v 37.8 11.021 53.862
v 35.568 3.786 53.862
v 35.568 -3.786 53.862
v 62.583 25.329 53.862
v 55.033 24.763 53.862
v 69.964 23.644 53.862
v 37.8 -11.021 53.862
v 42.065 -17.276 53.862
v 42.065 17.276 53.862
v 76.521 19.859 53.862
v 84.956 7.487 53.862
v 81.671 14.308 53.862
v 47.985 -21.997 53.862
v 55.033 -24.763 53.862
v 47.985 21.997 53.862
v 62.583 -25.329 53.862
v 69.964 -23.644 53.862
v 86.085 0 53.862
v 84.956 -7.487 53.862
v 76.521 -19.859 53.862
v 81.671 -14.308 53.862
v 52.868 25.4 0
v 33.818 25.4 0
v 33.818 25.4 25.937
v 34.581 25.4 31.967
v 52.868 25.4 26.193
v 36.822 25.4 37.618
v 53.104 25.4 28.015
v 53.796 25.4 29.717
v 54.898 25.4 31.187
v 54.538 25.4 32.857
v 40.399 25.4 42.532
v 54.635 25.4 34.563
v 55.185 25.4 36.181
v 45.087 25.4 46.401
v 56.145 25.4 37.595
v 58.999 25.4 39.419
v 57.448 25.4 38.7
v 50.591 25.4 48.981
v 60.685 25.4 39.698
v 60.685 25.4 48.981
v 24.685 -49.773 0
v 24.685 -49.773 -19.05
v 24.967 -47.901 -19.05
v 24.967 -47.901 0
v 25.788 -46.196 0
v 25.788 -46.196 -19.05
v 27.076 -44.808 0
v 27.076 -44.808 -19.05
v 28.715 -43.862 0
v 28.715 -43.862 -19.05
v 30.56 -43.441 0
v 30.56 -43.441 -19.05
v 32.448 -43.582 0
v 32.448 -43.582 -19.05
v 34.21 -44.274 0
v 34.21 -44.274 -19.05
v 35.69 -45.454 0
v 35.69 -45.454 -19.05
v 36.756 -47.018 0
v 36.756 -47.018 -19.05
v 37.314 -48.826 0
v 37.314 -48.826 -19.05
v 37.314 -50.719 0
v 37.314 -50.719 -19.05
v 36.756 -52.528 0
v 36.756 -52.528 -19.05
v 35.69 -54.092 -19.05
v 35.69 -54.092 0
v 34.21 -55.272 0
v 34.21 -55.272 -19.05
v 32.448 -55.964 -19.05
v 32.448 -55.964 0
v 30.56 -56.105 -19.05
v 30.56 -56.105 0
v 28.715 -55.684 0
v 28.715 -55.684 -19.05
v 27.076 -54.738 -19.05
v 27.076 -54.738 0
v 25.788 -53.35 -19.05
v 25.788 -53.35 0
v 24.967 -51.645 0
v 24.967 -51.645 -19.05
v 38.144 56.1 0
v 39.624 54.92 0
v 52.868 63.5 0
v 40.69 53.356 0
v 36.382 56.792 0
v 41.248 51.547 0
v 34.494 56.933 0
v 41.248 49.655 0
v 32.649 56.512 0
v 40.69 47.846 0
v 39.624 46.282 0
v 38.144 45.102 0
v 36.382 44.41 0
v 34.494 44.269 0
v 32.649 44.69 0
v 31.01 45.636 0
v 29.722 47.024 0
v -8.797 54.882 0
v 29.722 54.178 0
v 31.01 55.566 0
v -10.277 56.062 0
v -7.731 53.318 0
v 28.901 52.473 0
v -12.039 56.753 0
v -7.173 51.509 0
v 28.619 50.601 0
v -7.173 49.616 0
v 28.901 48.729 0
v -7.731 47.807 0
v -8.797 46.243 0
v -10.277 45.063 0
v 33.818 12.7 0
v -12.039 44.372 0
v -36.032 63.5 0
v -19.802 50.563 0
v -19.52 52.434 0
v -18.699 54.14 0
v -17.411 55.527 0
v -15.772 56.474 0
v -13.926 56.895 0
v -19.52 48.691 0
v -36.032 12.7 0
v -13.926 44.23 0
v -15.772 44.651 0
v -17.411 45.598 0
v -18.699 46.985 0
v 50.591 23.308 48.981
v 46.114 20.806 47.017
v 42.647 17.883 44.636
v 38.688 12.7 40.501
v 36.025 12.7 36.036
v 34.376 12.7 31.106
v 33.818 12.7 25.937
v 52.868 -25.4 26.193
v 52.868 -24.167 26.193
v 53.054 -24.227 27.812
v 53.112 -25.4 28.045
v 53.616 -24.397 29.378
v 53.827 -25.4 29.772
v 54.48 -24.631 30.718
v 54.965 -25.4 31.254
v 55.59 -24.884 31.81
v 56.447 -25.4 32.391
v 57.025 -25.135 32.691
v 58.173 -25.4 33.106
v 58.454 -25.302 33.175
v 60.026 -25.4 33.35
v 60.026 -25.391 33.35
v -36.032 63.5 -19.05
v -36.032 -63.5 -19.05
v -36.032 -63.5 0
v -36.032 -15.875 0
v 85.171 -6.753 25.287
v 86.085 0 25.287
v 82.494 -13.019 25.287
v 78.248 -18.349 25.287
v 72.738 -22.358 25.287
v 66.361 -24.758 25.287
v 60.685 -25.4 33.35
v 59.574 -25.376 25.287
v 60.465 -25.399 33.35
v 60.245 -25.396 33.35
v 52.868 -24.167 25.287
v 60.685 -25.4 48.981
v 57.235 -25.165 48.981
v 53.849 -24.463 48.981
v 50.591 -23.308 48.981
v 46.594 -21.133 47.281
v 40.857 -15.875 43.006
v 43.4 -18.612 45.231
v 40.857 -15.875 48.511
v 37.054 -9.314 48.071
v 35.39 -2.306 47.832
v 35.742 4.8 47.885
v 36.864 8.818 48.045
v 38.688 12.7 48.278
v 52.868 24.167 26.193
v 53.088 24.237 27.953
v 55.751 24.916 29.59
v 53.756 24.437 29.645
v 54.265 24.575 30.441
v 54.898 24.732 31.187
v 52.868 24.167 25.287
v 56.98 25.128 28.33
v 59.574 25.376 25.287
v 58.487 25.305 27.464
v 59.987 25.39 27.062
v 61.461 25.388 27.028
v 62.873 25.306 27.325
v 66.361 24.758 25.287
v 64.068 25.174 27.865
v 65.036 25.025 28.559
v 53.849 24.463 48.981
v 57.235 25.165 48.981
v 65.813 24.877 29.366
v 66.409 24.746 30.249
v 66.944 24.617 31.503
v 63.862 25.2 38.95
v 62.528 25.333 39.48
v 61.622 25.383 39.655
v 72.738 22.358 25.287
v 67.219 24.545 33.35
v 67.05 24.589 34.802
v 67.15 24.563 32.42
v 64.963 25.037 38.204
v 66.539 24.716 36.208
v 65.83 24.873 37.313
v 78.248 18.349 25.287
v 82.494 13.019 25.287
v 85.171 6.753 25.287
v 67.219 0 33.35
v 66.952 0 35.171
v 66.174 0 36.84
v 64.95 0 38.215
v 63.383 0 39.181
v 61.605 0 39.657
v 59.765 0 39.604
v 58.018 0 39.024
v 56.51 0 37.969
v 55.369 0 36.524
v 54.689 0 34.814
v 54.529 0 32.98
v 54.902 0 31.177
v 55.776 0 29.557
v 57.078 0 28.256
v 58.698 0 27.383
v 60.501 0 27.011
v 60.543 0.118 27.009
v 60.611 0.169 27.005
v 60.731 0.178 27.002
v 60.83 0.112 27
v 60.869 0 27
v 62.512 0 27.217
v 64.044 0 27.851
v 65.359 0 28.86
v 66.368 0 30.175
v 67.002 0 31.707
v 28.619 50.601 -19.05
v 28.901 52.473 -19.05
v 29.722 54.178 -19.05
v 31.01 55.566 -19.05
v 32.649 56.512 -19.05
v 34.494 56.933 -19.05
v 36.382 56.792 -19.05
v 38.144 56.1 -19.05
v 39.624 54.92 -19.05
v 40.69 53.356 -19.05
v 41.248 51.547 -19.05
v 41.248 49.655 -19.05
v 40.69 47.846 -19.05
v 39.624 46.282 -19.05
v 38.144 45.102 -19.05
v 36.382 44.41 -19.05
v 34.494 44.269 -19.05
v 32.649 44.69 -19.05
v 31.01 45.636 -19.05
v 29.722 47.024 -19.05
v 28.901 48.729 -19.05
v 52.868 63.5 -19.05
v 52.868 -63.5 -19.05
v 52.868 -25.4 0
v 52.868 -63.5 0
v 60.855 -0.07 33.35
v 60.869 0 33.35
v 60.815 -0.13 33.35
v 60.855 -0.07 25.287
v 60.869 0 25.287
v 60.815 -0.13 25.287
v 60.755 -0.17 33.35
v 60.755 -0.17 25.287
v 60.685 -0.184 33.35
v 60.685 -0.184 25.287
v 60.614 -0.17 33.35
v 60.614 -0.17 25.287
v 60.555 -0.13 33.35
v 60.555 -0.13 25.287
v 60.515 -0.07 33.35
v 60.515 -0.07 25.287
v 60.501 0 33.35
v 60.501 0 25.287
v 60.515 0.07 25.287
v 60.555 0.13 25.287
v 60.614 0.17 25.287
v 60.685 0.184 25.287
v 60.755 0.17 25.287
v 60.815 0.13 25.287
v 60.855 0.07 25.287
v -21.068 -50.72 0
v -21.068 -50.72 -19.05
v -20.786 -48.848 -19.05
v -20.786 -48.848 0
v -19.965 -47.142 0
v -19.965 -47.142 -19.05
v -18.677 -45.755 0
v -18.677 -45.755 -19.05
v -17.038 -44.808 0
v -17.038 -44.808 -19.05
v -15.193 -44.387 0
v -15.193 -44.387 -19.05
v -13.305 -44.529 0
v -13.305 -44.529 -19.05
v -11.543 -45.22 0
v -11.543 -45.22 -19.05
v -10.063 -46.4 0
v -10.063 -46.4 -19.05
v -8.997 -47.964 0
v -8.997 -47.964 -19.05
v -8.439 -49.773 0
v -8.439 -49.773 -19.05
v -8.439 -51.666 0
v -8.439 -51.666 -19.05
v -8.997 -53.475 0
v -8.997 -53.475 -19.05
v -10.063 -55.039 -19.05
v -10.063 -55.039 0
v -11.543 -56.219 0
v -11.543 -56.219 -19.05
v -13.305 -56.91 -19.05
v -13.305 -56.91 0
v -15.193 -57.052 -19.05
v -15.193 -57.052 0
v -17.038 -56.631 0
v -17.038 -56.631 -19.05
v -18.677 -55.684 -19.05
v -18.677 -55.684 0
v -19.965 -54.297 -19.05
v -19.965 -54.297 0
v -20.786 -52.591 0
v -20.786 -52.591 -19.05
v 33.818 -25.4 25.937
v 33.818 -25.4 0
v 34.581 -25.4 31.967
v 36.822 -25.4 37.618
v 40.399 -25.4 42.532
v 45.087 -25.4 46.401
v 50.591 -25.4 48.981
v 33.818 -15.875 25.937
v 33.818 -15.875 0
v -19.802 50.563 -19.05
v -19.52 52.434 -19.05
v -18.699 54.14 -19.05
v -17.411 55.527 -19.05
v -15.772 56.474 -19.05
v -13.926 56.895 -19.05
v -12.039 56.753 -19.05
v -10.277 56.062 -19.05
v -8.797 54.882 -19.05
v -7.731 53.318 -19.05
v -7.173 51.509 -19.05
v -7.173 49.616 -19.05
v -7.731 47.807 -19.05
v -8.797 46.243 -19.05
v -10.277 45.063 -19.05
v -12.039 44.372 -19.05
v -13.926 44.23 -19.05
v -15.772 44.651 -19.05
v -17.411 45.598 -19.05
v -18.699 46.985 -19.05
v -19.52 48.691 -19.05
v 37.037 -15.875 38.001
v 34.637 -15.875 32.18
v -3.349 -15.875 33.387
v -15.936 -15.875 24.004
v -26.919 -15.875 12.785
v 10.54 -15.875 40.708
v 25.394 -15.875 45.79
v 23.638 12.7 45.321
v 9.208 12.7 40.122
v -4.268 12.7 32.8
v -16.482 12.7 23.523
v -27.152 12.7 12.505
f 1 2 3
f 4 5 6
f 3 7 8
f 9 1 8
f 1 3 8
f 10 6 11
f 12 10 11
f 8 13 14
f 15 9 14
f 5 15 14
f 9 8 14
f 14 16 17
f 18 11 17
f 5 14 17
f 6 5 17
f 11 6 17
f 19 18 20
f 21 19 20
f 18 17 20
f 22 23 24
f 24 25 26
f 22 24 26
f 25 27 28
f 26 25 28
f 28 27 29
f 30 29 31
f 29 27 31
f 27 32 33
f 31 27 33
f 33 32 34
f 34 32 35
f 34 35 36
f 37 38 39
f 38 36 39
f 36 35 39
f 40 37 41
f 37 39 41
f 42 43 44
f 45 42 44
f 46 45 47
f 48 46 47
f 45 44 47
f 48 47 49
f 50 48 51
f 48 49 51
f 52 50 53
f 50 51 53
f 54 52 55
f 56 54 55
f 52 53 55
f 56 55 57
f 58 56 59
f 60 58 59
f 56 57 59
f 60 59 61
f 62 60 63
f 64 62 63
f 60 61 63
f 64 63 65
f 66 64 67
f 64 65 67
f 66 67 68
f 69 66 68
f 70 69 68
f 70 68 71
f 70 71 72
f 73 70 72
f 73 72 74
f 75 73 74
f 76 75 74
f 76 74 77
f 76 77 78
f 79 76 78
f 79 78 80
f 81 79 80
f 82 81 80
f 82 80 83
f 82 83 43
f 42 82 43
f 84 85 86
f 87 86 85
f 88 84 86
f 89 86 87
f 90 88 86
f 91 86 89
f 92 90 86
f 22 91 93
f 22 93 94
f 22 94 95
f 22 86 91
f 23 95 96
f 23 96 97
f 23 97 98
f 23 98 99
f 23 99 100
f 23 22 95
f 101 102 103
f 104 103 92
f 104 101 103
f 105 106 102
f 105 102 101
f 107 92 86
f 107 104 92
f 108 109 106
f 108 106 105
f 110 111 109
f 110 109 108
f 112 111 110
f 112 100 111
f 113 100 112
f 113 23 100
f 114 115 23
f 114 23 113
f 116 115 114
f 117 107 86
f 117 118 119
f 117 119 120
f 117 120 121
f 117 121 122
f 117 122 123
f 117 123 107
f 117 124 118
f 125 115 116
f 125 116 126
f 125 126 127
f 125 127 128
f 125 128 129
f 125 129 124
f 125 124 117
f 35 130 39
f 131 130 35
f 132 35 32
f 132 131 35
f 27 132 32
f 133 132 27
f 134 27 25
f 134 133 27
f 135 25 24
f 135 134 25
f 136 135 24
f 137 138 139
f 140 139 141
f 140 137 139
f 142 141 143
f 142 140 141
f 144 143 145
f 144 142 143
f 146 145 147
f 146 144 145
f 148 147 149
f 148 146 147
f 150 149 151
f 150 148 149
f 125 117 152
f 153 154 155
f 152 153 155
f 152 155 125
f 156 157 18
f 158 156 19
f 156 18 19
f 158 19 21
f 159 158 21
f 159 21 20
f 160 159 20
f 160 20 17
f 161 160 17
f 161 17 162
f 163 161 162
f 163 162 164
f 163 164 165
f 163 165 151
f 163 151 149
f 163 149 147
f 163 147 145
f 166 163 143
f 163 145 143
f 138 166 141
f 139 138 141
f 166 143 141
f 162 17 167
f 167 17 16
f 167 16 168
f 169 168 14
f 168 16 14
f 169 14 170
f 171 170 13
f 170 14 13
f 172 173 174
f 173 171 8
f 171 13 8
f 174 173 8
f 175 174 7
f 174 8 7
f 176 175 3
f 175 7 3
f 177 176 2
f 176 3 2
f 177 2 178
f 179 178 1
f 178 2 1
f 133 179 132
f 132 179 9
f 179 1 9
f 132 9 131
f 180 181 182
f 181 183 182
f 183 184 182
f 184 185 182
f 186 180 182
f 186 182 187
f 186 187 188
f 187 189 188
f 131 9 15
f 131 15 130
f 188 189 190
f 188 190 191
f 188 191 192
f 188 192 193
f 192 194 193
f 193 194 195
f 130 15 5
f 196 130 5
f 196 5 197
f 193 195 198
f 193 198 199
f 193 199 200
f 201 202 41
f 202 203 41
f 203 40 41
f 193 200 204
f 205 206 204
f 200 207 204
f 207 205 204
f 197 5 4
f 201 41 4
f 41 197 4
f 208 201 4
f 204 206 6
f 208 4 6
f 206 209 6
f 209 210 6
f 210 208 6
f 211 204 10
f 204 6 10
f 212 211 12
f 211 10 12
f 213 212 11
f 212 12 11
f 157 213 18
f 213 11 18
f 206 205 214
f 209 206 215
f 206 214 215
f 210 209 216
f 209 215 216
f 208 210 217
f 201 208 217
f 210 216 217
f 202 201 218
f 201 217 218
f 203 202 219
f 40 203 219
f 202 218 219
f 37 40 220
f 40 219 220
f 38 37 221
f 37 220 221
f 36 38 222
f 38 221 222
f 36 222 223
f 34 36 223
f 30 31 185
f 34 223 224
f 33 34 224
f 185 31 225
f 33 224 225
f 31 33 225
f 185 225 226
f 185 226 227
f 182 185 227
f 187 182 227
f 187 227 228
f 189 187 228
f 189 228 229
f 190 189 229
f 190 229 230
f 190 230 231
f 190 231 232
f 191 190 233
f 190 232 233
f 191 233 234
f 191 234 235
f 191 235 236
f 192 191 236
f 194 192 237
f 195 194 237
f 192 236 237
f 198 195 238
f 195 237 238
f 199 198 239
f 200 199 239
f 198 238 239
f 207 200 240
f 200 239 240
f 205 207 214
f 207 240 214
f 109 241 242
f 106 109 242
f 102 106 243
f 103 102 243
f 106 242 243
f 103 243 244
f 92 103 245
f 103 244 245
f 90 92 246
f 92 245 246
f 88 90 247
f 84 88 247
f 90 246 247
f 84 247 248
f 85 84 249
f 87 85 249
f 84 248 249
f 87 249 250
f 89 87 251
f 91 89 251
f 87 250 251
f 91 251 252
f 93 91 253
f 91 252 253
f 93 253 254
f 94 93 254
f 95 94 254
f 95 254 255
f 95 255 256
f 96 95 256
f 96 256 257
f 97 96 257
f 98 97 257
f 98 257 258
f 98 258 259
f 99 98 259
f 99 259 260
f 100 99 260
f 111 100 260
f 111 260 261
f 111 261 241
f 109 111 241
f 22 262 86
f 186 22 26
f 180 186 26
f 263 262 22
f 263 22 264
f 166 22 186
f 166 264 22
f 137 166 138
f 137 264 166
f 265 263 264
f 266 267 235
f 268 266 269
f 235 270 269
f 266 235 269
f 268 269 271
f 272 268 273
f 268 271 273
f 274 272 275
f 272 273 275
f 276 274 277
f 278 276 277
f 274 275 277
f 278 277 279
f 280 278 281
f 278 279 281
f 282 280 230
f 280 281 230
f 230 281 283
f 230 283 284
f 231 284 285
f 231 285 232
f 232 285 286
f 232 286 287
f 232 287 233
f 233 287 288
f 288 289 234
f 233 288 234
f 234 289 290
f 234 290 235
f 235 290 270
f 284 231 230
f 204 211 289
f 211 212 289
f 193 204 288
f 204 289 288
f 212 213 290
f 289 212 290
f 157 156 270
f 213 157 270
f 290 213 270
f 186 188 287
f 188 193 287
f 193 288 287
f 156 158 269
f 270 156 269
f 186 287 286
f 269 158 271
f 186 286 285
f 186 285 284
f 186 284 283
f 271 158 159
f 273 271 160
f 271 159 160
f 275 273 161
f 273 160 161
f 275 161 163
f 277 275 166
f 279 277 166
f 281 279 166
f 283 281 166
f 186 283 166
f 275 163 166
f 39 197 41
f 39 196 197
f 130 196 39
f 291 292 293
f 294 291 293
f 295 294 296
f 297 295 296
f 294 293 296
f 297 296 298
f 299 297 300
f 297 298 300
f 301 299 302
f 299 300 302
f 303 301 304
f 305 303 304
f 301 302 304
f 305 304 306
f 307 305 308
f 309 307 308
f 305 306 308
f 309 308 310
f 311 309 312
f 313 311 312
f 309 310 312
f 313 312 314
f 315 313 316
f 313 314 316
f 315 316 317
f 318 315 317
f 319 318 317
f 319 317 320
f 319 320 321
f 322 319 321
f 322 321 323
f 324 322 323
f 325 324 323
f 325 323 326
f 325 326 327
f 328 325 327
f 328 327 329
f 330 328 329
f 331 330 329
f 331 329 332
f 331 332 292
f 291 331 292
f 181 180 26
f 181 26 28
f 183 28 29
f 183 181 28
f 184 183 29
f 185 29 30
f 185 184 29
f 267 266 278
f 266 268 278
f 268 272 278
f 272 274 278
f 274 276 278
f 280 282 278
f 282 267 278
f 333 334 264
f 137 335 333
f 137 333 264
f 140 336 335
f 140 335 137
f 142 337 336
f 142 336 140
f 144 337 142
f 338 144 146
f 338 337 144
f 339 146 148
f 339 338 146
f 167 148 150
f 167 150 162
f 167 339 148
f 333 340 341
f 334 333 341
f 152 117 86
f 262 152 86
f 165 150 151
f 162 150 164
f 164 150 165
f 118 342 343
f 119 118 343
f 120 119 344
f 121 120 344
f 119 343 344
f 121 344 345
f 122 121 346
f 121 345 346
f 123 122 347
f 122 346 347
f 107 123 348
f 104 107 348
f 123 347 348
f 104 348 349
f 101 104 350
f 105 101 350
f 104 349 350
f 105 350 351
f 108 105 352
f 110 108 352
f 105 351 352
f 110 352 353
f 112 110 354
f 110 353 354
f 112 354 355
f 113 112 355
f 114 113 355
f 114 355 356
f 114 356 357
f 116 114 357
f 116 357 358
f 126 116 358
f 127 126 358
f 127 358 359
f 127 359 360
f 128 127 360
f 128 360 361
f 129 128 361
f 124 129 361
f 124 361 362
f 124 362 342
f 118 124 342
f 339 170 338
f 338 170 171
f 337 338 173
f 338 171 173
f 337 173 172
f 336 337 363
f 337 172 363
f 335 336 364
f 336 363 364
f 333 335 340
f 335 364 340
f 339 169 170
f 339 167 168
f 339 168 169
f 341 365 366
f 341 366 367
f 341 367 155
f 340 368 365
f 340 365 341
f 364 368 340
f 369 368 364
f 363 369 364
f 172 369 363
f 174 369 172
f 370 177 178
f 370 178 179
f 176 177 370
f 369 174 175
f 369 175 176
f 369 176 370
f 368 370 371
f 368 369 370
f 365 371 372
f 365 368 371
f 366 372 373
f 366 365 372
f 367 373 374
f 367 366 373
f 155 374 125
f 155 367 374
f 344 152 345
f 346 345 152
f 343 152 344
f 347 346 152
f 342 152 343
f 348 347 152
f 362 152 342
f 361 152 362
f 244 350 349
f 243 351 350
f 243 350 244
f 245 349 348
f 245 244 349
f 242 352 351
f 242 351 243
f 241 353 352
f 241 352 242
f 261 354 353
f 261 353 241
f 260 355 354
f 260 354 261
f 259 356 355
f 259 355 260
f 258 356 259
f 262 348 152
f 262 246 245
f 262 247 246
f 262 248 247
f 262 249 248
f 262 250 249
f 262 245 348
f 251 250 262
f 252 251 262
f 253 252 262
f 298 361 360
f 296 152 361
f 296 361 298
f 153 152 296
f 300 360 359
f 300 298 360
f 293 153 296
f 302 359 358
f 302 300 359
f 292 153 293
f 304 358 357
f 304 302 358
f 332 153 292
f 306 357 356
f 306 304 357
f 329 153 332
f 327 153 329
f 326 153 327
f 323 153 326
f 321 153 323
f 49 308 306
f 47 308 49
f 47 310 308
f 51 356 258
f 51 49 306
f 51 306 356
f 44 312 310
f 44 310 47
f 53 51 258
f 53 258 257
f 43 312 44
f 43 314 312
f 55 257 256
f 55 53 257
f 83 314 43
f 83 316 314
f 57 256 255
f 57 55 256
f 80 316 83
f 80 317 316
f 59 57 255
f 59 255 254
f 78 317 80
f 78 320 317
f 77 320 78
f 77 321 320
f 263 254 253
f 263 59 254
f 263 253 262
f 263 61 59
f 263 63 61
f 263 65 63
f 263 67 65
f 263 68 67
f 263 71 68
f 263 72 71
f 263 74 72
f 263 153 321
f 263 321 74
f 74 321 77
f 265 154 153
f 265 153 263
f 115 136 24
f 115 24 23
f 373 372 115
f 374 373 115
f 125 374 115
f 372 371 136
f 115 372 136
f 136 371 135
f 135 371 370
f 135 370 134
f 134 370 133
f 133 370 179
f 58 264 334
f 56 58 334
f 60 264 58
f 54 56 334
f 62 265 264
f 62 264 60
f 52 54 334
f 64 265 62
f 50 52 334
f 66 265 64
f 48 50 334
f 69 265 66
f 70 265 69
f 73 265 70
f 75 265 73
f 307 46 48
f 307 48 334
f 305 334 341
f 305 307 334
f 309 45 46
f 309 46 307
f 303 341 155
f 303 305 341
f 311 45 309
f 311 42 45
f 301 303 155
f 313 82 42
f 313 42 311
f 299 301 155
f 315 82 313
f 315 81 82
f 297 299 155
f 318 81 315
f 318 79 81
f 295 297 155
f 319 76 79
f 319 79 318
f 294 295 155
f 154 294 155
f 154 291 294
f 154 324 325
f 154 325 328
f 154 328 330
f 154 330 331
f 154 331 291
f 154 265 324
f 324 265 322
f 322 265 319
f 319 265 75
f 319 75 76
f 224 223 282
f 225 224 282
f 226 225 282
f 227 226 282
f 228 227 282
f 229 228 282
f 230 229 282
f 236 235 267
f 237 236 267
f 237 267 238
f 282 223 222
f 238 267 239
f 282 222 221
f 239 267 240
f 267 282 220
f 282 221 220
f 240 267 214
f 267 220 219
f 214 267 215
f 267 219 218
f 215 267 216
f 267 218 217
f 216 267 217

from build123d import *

# Parameters (mm, degrees)
F1_DEPTH        = 63.5
F2_DEPTH        = 15.875
F3_DEPTH        = 63.5
F0_W            = 19.05
F0_H            = 17.5050515682
F4_DEPTH        = 25.4
F5_DEPTH        = 25.4
F6_DEPTH        = 25.4
F7_DEPTH        = 12.7
F10_D           = 12.7
F10_ON_F0_D     = 12.7
F10_ON_F0_DEPTH = 63.501


with BuildPart() as f1:
    # F0 (on Front) → F1 (new body)
    with BuildSketch(Plane.XZ):
        Polygon((-36.0317155719, 0), (-36.0317155719, -19.05), (52.8682844281, -19.05), (52.8682844281, 0), (33.8182844281, 0), align=None)
    extrude(amount=F1_DEPTH)

    # F0 (on Front) → F2 (join)
    with BuildSketch(Plane.XZ):
        with BuildLine():
            ThreePointArc((50.590518862, 48.9809869127), (0.8347438774, 35.8877863894), (-36.0317155719, 0))
            Line((-36.0317155719, 0), (33.8182844281, 0))
            Line((33.8182844281, 0), (33.8182844281, 17.5050515682))
            Line((33.8182844281, 17.5050515682), (33.8182844281, 25.9368028492))
            ThreePointArc((33.8182844281, 25.9368028492), (38.4552849671, 40.1876121864), (50.590518862, 48.9809869127))
        make_face()
    extrude(amount=F2_DEPTH)

    # F0 (on Front) → F3 (join)
    with BuildSketch(Plane.XZ):
        Polygon((-36.0317155719, 0), (-36.0317155719, -19.05), (52.8682844281, -19.05), (52.8682844281, 0), (33.8182844281, 0), align=None)
    extrude(amount=-F3_DEPTH)

    # F0 (on Front) → F4 (join)
    with BuildSketch(Plane.XZ):
        with BuildLine():
            Line((60.4371747272, 48.9809869127), (50.590518862, 48.9809869127))
            ThreePointArc((50.590518862, 48.9809869127), (38.4552849671, 40.1876121864), (33.8182844281, 25.9368028492))
            Line((33.8182844281, 25.9368028492), (33.8182844281, 17.5050515682))
            Line((33.8182844281, 17.5050515682), (52.8682844281, 17.5050515682))
            Line((52.8682844281, 17.5050515682), (52.8682844281, 26.1928199722))
            ThreePointArc((52.8682844281, 26.1928199722), (54.9646325027, 31.2538519254), (60.0256644559, 33.3502))
            Line((60.0256644559, 33.3502), (60.6846340656, 33.3502))
            Line((60.6846340656, 33.3502), (60.6846340656, 48.9809869127))
            Line((60.6846340656, 48.9809869127), (60.4371747272, 48.9809869127))
        make_face()
        with Locations((43.3432844281, 8.7525257841)):
            Rectangle(F0_W, F0_H)
    extrude(amount=F4_DEPTH)

    # F0 (on Front) → F5 (join)
    with BuildSketch(Plane.XZ):
        with BuildLine():
            Line((60.4371747272, 48.9809869127), (50.590518862, 48.9809869127))
            ThreePointArc((50.590518862, 48.9809869127), (38.4552849671, 40.1876121864), (33.8182844281, 25.9368028492))
            Line((33.8182844281, 25.9368028492), (33.8182844281, 17.5050515682))
            Line((33.8182844281, 17.5050515682), (52.8682844281, 17.5050515682))
            Line((52.8682844281, 17.5050515682), (52.8682844281, 26.1928199722))
            ThreePointArc((52.8682844281, 26.1928199722), (54.9646325027, 31.2538519254), (60.0256644559, 33.3502))
            Line((60.0256644559, 33.3502), (60.6846340656, 33.3502))
            Line((60.6846340656, 33.3502), (60.6846340656, 48.9809869127))
            Line((60.6846340656, 48.9809869127), (60.4371747272, 48.9809869127))
        make_face()
        with Locations((43.3432844281, 8.7525257841)):
            Rectangle(F0_W, F0_H)
    extrude(amount=-F5_DEPTH)

    # F0 (on Front) → F6 (join)
    with BuildSketch(Plane.XZ):
        with Locations((43.3432844281, 8.7525257841)):
            Rectangle(F0_W, F0_H)
    extrude(amount=-F6_DEPTH)

    # F0 (on Front) → F7 (join)
    with BuildSketch(Plane.XZ):
        with BuildLine():
            ThreePointArc((50.590518862, 48.9809869127), (0.8347438774, 35.8877863894), (-36.0317155719, 0))
            Line((-36.0317155719, 0), (33.8182844281, 0))
            Line((33.8182844281, 0), (33.8182844281, 17.5050515682))
            Line((33.8182844281, 17.5050515682), (33.8182844281, 25.9368028492))
            ThreePointArc((33.8182844281, 25.9368028492), (38.4552849671, 40.1876121864), (50.590518862, 48.9809869127))
        make_face()
    extrude(amount=-F7_DEPTH)

    # F0 (on Front) → F8 (revolve)
    with BuildSketch(Plane.XZ):
        Polygon((60.6846340656, 53.8622255534), (60.6846340656, 48.9809869127), (60.6846340656, 33.3502), (60.8685202897, 33.3502), (60.8685202897, 25.2872255534), (86.0846340656, 25.2872255534), (86.0846340656, 53.8622255534), align=None)
    revolve(axis=Axis((60.6846340656, 0, 39.5747255534), (0, 0, -1)))

    # F10 (through all)
    with Locations(Plane.XY):
        with Locations((-13.4519258065, 50.5625051313), (34.9686927695, 50.6009981846), (31.0349383496, -49.7729142204), (-14.7181544946, -50.7195290418)):
            Hole(F10_D / 2)

    # F10 on F0 (through all, one way)
    with BuildSketch(Plane.XZ):
        with Locations((60.8685202897, 33.3502)):
            Circle(F10_ON_F0_D / 2)
    extrude(amount=-F10_ON_F0_DEPTH, mode=Mode.SUBTRACT)


solid = f1.part
